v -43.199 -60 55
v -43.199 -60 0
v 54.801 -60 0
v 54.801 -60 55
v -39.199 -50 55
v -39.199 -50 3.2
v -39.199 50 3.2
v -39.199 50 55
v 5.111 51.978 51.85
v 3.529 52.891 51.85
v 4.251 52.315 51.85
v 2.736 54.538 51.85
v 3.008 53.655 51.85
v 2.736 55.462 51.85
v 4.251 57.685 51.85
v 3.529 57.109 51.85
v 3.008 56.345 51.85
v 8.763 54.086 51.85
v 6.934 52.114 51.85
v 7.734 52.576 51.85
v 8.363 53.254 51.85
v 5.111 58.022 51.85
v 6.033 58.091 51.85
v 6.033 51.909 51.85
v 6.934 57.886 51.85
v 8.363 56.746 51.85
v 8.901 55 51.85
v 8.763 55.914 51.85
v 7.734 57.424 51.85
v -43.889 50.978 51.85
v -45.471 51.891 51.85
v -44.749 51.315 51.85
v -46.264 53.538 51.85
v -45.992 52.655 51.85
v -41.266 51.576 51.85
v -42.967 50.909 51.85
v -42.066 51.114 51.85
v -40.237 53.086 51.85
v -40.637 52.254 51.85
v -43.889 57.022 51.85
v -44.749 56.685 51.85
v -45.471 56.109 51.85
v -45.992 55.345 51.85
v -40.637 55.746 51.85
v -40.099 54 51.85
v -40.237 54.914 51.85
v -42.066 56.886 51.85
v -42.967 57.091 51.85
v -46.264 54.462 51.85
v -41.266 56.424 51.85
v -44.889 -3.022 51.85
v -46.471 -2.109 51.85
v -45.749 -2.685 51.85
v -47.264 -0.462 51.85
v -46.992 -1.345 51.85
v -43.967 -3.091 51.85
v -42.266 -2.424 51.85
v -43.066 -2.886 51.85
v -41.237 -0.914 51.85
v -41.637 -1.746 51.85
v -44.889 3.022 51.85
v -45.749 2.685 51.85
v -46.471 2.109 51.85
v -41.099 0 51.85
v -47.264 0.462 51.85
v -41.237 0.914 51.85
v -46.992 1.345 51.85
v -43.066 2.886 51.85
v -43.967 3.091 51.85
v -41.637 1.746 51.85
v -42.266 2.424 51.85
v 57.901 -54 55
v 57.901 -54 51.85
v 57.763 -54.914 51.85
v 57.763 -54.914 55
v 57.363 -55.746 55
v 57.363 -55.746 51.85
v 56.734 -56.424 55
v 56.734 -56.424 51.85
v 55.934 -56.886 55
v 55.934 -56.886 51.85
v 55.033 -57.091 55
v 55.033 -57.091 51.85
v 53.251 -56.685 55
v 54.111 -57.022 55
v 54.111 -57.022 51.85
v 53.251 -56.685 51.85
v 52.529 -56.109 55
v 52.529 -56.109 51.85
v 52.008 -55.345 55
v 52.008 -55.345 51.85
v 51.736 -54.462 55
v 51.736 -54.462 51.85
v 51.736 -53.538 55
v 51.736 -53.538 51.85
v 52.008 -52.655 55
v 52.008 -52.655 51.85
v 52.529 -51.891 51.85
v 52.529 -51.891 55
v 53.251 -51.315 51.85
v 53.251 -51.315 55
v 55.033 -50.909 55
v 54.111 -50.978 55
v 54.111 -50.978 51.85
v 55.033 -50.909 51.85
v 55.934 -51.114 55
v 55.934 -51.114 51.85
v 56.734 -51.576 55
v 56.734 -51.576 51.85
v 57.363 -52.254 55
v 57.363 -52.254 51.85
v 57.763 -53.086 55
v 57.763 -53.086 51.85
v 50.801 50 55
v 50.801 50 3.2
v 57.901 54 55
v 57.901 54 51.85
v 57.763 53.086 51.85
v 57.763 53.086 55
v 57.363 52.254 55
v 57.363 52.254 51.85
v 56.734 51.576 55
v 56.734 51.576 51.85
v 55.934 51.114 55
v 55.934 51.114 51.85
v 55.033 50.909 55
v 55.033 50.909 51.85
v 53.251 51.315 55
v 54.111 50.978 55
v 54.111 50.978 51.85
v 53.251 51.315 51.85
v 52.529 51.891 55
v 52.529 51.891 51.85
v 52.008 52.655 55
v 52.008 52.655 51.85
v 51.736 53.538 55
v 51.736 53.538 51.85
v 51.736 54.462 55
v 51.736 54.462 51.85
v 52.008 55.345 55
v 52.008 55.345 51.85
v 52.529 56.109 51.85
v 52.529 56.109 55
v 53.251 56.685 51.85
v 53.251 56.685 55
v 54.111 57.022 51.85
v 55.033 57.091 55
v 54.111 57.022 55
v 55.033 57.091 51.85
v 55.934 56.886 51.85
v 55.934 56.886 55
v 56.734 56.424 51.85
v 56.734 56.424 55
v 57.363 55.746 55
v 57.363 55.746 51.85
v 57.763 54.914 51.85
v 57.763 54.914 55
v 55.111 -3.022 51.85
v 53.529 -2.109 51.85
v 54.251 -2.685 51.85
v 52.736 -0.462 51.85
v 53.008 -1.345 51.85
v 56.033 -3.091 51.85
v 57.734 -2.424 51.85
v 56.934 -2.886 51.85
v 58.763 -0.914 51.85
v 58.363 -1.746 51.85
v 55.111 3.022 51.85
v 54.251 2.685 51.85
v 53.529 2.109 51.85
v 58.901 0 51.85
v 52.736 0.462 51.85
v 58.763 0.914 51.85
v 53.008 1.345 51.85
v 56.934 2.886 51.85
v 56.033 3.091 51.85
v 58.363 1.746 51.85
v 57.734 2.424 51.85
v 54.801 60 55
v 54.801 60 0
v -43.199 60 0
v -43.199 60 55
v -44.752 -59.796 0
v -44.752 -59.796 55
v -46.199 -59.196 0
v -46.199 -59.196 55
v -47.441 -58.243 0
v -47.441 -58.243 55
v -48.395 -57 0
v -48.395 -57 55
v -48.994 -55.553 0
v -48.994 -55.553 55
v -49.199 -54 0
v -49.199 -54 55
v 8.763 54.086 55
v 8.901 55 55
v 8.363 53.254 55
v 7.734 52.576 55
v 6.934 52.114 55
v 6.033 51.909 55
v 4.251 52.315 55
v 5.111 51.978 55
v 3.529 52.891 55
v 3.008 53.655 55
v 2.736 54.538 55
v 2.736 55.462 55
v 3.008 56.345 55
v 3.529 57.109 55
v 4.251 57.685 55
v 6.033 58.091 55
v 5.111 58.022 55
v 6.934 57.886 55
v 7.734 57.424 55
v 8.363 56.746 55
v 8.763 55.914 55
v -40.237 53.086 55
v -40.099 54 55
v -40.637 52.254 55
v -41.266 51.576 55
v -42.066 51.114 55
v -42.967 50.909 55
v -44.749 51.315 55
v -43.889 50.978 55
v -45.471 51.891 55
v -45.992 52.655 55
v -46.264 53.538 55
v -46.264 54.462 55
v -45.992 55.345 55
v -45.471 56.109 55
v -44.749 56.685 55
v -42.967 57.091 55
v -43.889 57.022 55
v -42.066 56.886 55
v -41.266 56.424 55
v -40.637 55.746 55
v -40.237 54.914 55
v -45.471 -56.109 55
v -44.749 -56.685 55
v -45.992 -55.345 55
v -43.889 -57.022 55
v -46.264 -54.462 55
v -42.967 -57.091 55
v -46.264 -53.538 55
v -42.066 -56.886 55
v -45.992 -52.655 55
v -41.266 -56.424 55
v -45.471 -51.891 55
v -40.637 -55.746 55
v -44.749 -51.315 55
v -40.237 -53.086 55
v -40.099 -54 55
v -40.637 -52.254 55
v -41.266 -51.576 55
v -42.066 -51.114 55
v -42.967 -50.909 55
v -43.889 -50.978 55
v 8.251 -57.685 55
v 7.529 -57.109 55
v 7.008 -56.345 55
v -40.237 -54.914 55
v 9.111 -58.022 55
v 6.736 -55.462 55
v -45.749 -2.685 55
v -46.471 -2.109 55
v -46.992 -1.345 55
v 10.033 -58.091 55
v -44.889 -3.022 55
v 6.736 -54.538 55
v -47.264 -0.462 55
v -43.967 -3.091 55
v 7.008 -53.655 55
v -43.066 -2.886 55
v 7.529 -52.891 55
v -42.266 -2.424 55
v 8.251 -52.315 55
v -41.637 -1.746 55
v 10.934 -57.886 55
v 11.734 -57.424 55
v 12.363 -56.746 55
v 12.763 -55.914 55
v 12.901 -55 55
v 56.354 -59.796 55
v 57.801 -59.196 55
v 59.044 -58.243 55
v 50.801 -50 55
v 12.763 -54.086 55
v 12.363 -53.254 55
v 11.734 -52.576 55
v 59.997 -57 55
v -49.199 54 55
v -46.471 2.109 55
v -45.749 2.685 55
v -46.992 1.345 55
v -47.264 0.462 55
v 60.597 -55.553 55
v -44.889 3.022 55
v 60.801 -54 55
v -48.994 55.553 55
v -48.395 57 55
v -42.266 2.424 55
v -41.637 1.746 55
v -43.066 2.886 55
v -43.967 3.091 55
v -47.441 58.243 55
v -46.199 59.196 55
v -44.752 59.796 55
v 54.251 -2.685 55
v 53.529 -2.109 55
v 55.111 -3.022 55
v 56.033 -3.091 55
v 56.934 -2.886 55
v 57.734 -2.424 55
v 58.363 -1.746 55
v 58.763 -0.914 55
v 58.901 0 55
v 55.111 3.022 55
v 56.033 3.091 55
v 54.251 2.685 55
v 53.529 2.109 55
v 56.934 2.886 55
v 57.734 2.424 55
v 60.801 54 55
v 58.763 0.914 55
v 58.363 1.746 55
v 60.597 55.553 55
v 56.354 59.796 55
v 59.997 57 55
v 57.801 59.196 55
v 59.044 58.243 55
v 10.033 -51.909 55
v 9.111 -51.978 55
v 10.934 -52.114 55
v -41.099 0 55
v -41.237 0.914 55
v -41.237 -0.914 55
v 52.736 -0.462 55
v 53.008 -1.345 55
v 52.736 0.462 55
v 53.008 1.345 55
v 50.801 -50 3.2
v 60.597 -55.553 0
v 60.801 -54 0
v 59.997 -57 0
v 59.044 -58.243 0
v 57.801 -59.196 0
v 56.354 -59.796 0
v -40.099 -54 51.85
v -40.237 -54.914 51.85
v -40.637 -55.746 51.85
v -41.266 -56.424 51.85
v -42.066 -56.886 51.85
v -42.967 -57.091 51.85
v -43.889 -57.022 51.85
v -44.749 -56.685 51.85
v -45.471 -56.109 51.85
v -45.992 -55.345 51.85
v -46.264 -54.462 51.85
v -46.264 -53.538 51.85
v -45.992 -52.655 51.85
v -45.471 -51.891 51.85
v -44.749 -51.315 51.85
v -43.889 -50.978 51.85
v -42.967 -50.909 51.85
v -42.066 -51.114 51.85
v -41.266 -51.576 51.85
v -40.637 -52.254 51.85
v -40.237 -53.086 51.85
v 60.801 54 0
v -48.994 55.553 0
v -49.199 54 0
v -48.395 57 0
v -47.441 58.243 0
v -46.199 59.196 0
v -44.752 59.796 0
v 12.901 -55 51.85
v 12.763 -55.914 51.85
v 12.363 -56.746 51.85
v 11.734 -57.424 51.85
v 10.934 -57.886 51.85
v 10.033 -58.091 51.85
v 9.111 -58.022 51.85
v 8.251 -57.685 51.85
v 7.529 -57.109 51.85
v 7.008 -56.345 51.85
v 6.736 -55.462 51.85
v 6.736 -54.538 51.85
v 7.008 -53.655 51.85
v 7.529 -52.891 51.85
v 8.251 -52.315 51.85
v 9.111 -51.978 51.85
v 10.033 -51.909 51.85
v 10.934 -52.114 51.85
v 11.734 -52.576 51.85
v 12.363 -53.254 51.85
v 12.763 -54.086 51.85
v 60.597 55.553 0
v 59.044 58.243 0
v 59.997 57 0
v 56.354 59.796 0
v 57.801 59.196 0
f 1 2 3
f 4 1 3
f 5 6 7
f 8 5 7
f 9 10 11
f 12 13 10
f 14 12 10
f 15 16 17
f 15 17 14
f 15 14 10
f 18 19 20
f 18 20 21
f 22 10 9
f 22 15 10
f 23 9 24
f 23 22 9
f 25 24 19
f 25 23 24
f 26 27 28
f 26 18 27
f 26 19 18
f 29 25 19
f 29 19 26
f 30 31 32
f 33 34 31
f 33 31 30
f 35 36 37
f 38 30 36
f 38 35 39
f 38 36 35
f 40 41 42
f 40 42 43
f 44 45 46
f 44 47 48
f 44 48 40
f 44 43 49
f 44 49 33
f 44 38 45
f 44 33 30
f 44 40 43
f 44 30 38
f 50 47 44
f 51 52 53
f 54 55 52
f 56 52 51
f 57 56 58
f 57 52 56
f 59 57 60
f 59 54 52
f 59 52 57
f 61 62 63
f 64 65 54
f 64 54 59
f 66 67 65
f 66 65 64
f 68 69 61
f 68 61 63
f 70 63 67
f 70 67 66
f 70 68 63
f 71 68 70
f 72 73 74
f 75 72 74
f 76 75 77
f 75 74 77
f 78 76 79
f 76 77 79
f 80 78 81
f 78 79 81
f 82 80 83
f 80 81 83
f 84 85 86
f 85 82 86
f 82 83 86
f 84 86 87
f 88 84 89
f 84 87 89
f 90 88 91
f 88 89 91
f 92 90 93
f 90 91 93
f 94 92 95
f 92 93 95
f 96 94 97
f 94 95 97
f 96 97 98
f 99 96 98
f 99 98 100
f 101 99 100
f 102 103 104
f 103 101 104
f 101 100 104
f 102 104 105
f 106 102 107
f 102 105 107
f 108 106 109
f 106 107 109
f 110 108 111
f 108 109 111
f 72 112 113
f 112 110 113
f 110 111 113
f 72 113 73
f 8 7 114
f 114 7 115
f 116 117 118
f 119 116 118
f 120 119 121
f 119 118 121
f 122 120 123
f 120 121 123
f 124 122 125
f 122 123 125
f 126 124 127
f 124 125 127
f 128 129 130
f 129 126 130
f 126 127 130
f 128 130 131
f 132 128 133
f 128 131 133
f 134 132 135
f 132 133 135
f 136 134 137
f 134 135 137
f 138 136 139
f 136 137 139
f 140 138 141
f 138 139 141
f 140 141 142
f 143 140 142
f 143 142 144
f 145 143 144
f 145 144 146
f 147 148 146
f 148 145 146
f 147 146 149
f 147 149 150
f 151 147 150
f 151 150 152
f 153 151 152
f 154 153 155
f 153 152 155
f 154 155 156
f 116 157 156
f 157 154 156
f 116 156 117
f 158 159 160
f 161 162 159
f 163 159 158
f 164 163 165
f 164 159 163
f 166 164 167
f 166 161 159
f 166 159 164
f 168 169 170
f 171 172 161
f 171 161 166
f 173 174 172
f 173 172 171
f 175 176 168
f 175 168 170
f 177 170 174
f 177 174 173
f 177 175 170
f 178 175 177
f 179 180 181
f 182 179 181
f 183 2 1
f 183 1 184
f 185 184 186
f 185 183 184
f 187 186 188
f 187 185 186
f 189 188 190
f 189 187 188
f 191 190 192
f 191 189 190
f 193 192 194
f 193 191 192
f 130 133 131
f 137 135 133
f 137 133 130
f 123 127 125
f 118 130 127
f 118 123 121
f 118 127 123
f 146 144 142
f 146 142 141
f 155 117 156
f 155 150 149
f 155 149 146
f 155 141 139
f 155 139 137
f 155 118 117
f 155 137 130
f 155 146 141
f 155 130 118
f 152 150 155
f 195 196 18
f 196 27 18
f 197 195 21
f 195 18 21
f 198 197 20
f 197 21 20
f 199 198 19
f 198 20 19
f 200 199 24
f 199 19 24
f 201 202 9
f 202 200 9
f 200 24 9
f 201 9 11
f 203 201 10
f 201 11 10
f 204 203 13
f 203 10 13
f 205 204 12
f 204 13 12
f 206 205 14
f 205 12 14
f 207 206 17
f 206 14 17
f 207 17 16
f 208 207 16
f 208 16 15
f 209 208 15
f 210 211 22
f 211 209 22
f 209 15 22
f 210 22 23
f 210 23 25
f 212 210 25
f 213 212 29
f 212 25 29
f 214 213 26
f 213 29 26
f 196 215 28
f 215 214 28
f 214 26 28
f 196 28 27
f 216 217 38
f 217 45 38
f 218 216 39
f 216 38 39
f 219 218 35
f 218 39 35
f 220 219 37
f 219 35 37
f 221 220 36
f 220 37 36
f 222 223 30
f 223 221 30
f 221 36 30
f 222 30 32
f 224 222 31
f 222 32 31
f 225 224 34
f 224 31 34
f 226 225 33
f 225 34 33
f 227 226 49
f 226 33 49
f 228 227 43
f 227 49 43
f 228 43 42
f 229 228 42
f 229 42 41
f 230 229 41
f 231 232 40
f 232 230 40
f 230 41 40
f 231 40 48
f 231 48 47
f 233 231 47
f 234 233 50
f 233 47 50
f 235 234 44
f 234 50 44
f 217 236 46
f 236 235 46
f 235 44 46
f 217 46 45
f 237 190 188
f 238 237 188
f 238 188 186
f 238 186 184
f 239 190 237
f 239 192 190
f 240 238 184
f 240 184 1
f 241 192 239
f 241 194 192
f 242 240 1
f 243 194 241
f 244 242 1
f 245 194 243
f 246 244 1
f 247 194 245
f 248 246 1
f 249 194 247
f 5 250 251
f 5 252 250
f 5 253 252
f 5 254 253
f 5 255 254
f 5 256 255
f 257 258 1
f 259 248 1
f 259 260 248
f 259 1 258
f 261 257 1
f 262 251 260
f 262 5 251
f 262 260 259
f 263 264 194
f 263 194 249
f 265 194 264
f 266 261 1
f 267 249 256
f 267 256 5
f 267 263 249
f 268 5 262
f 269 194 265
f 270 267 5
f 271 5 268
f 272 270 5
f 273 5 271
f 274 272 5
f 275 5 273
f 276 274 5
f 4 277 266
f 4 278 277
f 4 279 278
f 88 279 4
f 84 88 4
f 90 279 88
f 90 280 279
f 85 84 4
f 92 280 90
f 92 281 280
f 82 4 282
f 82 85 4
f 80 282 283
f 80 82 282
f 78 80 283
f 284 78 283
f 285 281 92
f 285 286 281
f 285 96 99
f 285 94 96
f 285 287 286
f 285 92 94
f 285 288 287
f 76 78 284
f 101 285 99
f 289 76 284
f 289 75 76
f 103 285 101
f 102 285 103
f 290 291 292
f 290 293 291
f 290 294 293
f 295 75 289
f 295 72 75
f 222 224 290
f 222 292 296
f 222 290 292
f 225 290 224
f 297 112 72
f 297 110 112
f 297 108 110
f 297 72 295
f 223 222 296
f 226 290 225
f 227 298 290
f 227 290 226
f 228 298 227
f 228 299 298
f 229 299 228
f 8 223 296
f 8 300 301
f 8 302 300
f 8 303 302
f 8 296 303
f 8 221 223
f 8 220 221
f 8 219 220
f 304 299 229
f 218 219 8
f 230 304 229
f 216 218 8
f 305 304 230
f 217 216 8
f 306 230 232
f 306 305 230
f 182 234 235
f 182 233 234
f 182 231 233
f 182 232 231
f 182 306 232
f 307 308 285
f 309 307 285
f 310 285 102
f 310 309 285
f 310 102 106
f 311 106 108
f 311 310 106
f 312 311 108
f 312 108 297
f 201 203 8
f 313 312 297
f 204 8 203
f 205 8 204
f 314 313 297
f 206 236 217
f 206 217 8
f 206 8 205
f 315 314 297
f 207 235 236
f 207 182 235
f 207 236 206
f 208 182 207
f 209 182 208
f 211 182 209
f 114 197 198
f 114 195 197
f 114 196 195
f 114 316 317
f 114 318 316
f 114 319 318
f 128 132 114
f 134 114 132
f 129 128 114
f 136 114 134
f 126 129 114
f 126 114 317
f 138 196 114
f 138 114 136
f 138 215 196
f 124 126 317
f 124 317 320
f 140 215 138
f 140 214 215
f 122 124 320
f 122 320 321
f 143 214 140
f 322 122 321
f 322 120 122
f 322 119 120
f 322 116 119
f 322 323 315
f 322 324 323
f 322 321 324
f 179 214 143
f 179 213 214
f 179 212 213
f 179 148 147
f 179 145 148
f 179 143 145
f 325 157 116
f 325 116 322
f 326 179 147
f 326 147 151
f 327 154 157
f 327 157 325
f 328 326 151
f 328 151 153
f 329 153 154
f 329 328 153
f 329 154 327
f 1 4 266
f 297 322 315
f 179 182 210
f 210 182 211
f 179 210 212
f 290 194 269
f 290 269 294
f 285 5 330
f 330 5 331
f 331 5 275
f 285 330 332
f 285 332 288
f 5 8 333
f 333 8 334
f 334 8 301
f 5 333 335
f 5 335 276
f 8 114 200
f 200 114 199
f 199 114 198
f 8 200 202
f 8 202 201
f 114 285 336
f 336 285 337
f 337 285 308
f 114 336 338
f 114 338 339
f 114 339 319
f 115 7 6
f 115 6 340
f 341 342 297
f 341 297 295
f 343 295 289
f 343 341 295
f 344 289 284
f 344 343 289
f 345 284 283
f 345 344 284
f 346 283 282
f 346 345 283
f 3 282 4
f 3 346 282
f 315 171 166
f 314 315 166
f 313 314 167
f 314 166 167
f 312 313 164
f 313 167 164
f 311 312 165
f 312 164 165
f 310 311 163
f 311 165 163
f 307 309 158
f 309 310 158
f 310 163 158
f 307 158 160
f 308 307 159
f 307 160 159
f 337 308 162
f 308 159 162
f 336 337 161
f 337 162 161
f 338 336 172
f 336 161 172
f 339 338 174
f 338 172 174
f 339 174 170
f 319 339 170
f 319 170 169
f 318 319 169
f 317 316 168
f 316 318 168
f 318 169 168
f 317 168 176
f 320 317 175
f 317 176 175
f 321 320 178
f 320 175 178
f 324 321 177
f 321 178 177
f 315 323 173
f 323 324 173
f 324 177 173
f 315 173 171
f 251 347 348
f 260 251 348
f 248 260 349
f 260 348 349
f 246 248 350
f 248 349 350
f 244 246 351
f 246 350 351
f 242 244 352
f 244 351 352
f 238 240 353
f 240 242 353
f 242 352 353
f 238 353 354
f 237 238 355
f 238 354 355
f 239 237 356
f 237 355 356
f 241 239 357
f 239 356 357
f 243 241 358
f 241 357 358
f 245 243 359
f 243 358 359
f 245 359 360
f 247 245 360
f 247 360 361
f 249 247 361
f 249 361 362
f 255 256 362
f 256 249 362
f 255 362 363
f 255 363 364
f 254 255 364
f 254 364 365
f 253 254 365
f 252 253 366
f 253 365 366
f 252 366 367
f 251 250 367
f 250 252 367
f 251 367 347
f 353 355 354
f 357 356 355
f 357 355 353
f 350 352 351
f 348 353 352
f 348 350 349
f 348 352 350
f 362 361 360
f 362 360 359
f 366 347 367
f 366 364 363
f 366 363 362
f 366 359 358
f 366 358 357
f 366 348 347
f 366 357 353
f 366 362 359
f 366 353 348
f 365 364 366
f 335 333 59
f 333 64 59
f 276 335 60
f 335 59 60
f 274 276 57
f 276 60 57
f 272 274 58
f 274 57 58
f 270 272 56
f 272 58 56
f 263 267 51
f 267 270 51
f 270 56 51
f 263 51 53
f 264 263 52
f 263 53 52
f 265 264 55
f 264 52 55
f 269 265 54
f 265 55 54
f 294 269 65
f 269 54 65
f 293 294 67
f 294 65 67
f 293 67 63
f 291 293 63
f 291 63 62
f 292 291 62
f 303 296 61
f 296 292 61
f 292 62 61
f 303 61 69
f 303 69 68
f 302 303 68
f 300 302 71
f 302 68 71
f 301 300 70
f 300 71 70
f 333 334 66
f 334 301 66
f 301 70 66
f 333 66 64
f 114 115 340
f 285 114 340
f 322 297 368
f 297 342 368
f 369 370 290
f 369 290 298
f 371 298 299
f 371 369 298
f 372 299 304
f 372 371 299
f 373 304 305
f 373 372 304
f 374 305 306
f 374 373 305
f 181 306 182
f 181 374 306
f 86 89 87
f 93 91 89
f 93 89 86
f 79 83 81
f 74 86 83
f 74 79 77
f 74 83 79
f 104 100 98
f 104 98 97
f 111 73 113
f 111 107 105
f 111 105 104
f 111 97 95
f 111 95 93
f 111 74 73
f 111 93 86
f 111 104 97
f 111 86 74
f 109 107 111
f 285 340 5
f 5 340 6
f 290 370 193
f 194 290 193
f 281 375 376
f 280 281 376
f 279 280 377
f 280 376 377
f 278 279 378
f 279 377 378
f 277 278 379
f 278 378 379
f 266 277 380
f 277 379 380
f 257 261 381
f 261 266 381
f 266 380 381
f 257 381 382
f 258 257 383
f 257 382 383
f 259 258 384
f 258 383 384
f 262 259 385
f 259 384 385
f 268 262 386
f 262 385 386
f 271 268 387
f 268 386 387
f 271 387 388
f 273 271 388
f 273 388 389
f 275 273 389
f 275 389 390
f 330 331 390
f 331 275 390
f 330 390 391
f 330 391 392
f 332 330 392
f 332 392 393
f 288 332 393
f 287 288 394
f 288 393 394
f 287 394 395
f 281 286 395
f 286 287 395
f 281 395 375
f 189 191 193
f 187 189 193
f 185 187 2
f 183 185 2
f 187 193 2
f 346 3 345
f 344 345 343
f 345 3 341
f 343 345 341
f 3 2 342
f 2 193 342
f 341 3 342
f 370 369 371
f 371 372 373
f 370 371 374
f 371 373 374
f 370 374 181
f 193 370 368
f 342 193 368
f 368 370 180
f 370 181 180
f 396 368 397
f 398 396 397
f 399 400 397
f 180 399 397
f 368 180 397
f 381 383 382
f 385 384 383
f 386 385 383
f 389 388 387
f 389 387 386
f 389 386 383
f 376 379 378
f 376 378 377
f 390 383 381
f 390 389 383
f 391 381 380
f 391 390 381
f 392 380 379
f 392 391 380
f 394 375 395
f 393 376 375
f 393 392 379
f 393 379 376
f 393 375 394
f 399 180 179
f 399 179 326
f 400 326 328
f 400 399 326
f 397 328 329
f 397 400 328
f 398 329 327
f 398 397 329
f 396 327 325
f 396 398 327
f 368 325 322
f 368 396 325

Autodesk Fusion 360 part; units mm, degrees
sketch "Sketch1" plane through (0, 0, 0) normal (0, 0, 1) x (1, 0, 0)
  line L0 (-39.1988, 50) -> (50.8012, 50)
  line L1 (50.8012, 50) -> (50.8012, -50)
  line L2 (50.8012, -50) -> (-39.1988, -50)
  line L3 (-39.1988, -50) -> (-39.1988, 50)
  line L4 (-43.1988, -60) -> (54.8012, -60)
  line L5 (60.8012, -54) -> (60.8012, 54)
  line L6 (54.8012, 60) -> (-43.1988, 60)
  line L7 (-49.1988, 54) -> (-49.1988, -54)
  circle A0 centre (9.8012, -55) radius 3.1
  circle A1 centre (54.8012, -54) radius 3.1
  circle A2 centre (-43.1988, -54) radius 3.1
  circle A3 centre (55.8012, 0) radius 3.1
  circle A4 centre (54.8012, 54) radius 3.1
  circle A5 centre (-44.1988, 0) radius 3.1
  circle A6 centre (-43.1988, 54) radius 3.1
  circle A7 centre (5.8012, 55) radius 3.1
  arc A8 (-49.1988, -54) -> (-43.1988, -60) centre (-43.1988, -54) ccw
  arc A9 (54.8012, -60) -> (60.8012, -54) centre (54.8012, -54) ccw
  arc A10 (60.8012, 54) -> (54.8012, 60) centre (54.8012, 54) ccw
  arc A11 (-43.1988, 60) -> (-49.1988, 54) centre (-43.1988, 54) ccw
  dimension "d1" = 90
  dimension "d5" = 10
  dimension "d6" = 10
  dimension "d7" = 6.2
  dimension "d8" = 6.2
  dimension "d9" = 6.2
  dimension "d10" = 6
  dimension "d11" = 6
  dimension "d12" = 6
  dimension "d13" = 6
  dimension "d14" = 59
  dimension "d15" = 6.2
  dimension "d16" = 6.2
  dimension "d17" = 6
  dimension "d18" = 6
  dimension "d19" = 60
  dimension "d20" = 6.2
  dimension "d21" = 5
  dimension "d22" = 5
  dimension "d23" = 5
  dimension "d24" = 6.2
  dimension "d25" = 6
  dimension "d26" = 6
  dimension "d27" = 60
  dimension "d28" = 6.2
  dimension "d29" = 5
  dimension "d30" = 55
  dimension "d31" = 6
  dimension "d32" = 6
  dimension "d33" = 6
  dimension "d34" = 6
extrude "Extrude1" add sketch "Sketch1" along normal blind 55
extrude "Extrude2" add sketch "Sketch1" along normal blind 3.2 contours L0 L1 L2 L3
extrude "Extrude3" add sketch "Sketch1" along normal blind 51.85 contours A0 | A1 | A2 | A3 | A4 | A5 | A6 | A7
